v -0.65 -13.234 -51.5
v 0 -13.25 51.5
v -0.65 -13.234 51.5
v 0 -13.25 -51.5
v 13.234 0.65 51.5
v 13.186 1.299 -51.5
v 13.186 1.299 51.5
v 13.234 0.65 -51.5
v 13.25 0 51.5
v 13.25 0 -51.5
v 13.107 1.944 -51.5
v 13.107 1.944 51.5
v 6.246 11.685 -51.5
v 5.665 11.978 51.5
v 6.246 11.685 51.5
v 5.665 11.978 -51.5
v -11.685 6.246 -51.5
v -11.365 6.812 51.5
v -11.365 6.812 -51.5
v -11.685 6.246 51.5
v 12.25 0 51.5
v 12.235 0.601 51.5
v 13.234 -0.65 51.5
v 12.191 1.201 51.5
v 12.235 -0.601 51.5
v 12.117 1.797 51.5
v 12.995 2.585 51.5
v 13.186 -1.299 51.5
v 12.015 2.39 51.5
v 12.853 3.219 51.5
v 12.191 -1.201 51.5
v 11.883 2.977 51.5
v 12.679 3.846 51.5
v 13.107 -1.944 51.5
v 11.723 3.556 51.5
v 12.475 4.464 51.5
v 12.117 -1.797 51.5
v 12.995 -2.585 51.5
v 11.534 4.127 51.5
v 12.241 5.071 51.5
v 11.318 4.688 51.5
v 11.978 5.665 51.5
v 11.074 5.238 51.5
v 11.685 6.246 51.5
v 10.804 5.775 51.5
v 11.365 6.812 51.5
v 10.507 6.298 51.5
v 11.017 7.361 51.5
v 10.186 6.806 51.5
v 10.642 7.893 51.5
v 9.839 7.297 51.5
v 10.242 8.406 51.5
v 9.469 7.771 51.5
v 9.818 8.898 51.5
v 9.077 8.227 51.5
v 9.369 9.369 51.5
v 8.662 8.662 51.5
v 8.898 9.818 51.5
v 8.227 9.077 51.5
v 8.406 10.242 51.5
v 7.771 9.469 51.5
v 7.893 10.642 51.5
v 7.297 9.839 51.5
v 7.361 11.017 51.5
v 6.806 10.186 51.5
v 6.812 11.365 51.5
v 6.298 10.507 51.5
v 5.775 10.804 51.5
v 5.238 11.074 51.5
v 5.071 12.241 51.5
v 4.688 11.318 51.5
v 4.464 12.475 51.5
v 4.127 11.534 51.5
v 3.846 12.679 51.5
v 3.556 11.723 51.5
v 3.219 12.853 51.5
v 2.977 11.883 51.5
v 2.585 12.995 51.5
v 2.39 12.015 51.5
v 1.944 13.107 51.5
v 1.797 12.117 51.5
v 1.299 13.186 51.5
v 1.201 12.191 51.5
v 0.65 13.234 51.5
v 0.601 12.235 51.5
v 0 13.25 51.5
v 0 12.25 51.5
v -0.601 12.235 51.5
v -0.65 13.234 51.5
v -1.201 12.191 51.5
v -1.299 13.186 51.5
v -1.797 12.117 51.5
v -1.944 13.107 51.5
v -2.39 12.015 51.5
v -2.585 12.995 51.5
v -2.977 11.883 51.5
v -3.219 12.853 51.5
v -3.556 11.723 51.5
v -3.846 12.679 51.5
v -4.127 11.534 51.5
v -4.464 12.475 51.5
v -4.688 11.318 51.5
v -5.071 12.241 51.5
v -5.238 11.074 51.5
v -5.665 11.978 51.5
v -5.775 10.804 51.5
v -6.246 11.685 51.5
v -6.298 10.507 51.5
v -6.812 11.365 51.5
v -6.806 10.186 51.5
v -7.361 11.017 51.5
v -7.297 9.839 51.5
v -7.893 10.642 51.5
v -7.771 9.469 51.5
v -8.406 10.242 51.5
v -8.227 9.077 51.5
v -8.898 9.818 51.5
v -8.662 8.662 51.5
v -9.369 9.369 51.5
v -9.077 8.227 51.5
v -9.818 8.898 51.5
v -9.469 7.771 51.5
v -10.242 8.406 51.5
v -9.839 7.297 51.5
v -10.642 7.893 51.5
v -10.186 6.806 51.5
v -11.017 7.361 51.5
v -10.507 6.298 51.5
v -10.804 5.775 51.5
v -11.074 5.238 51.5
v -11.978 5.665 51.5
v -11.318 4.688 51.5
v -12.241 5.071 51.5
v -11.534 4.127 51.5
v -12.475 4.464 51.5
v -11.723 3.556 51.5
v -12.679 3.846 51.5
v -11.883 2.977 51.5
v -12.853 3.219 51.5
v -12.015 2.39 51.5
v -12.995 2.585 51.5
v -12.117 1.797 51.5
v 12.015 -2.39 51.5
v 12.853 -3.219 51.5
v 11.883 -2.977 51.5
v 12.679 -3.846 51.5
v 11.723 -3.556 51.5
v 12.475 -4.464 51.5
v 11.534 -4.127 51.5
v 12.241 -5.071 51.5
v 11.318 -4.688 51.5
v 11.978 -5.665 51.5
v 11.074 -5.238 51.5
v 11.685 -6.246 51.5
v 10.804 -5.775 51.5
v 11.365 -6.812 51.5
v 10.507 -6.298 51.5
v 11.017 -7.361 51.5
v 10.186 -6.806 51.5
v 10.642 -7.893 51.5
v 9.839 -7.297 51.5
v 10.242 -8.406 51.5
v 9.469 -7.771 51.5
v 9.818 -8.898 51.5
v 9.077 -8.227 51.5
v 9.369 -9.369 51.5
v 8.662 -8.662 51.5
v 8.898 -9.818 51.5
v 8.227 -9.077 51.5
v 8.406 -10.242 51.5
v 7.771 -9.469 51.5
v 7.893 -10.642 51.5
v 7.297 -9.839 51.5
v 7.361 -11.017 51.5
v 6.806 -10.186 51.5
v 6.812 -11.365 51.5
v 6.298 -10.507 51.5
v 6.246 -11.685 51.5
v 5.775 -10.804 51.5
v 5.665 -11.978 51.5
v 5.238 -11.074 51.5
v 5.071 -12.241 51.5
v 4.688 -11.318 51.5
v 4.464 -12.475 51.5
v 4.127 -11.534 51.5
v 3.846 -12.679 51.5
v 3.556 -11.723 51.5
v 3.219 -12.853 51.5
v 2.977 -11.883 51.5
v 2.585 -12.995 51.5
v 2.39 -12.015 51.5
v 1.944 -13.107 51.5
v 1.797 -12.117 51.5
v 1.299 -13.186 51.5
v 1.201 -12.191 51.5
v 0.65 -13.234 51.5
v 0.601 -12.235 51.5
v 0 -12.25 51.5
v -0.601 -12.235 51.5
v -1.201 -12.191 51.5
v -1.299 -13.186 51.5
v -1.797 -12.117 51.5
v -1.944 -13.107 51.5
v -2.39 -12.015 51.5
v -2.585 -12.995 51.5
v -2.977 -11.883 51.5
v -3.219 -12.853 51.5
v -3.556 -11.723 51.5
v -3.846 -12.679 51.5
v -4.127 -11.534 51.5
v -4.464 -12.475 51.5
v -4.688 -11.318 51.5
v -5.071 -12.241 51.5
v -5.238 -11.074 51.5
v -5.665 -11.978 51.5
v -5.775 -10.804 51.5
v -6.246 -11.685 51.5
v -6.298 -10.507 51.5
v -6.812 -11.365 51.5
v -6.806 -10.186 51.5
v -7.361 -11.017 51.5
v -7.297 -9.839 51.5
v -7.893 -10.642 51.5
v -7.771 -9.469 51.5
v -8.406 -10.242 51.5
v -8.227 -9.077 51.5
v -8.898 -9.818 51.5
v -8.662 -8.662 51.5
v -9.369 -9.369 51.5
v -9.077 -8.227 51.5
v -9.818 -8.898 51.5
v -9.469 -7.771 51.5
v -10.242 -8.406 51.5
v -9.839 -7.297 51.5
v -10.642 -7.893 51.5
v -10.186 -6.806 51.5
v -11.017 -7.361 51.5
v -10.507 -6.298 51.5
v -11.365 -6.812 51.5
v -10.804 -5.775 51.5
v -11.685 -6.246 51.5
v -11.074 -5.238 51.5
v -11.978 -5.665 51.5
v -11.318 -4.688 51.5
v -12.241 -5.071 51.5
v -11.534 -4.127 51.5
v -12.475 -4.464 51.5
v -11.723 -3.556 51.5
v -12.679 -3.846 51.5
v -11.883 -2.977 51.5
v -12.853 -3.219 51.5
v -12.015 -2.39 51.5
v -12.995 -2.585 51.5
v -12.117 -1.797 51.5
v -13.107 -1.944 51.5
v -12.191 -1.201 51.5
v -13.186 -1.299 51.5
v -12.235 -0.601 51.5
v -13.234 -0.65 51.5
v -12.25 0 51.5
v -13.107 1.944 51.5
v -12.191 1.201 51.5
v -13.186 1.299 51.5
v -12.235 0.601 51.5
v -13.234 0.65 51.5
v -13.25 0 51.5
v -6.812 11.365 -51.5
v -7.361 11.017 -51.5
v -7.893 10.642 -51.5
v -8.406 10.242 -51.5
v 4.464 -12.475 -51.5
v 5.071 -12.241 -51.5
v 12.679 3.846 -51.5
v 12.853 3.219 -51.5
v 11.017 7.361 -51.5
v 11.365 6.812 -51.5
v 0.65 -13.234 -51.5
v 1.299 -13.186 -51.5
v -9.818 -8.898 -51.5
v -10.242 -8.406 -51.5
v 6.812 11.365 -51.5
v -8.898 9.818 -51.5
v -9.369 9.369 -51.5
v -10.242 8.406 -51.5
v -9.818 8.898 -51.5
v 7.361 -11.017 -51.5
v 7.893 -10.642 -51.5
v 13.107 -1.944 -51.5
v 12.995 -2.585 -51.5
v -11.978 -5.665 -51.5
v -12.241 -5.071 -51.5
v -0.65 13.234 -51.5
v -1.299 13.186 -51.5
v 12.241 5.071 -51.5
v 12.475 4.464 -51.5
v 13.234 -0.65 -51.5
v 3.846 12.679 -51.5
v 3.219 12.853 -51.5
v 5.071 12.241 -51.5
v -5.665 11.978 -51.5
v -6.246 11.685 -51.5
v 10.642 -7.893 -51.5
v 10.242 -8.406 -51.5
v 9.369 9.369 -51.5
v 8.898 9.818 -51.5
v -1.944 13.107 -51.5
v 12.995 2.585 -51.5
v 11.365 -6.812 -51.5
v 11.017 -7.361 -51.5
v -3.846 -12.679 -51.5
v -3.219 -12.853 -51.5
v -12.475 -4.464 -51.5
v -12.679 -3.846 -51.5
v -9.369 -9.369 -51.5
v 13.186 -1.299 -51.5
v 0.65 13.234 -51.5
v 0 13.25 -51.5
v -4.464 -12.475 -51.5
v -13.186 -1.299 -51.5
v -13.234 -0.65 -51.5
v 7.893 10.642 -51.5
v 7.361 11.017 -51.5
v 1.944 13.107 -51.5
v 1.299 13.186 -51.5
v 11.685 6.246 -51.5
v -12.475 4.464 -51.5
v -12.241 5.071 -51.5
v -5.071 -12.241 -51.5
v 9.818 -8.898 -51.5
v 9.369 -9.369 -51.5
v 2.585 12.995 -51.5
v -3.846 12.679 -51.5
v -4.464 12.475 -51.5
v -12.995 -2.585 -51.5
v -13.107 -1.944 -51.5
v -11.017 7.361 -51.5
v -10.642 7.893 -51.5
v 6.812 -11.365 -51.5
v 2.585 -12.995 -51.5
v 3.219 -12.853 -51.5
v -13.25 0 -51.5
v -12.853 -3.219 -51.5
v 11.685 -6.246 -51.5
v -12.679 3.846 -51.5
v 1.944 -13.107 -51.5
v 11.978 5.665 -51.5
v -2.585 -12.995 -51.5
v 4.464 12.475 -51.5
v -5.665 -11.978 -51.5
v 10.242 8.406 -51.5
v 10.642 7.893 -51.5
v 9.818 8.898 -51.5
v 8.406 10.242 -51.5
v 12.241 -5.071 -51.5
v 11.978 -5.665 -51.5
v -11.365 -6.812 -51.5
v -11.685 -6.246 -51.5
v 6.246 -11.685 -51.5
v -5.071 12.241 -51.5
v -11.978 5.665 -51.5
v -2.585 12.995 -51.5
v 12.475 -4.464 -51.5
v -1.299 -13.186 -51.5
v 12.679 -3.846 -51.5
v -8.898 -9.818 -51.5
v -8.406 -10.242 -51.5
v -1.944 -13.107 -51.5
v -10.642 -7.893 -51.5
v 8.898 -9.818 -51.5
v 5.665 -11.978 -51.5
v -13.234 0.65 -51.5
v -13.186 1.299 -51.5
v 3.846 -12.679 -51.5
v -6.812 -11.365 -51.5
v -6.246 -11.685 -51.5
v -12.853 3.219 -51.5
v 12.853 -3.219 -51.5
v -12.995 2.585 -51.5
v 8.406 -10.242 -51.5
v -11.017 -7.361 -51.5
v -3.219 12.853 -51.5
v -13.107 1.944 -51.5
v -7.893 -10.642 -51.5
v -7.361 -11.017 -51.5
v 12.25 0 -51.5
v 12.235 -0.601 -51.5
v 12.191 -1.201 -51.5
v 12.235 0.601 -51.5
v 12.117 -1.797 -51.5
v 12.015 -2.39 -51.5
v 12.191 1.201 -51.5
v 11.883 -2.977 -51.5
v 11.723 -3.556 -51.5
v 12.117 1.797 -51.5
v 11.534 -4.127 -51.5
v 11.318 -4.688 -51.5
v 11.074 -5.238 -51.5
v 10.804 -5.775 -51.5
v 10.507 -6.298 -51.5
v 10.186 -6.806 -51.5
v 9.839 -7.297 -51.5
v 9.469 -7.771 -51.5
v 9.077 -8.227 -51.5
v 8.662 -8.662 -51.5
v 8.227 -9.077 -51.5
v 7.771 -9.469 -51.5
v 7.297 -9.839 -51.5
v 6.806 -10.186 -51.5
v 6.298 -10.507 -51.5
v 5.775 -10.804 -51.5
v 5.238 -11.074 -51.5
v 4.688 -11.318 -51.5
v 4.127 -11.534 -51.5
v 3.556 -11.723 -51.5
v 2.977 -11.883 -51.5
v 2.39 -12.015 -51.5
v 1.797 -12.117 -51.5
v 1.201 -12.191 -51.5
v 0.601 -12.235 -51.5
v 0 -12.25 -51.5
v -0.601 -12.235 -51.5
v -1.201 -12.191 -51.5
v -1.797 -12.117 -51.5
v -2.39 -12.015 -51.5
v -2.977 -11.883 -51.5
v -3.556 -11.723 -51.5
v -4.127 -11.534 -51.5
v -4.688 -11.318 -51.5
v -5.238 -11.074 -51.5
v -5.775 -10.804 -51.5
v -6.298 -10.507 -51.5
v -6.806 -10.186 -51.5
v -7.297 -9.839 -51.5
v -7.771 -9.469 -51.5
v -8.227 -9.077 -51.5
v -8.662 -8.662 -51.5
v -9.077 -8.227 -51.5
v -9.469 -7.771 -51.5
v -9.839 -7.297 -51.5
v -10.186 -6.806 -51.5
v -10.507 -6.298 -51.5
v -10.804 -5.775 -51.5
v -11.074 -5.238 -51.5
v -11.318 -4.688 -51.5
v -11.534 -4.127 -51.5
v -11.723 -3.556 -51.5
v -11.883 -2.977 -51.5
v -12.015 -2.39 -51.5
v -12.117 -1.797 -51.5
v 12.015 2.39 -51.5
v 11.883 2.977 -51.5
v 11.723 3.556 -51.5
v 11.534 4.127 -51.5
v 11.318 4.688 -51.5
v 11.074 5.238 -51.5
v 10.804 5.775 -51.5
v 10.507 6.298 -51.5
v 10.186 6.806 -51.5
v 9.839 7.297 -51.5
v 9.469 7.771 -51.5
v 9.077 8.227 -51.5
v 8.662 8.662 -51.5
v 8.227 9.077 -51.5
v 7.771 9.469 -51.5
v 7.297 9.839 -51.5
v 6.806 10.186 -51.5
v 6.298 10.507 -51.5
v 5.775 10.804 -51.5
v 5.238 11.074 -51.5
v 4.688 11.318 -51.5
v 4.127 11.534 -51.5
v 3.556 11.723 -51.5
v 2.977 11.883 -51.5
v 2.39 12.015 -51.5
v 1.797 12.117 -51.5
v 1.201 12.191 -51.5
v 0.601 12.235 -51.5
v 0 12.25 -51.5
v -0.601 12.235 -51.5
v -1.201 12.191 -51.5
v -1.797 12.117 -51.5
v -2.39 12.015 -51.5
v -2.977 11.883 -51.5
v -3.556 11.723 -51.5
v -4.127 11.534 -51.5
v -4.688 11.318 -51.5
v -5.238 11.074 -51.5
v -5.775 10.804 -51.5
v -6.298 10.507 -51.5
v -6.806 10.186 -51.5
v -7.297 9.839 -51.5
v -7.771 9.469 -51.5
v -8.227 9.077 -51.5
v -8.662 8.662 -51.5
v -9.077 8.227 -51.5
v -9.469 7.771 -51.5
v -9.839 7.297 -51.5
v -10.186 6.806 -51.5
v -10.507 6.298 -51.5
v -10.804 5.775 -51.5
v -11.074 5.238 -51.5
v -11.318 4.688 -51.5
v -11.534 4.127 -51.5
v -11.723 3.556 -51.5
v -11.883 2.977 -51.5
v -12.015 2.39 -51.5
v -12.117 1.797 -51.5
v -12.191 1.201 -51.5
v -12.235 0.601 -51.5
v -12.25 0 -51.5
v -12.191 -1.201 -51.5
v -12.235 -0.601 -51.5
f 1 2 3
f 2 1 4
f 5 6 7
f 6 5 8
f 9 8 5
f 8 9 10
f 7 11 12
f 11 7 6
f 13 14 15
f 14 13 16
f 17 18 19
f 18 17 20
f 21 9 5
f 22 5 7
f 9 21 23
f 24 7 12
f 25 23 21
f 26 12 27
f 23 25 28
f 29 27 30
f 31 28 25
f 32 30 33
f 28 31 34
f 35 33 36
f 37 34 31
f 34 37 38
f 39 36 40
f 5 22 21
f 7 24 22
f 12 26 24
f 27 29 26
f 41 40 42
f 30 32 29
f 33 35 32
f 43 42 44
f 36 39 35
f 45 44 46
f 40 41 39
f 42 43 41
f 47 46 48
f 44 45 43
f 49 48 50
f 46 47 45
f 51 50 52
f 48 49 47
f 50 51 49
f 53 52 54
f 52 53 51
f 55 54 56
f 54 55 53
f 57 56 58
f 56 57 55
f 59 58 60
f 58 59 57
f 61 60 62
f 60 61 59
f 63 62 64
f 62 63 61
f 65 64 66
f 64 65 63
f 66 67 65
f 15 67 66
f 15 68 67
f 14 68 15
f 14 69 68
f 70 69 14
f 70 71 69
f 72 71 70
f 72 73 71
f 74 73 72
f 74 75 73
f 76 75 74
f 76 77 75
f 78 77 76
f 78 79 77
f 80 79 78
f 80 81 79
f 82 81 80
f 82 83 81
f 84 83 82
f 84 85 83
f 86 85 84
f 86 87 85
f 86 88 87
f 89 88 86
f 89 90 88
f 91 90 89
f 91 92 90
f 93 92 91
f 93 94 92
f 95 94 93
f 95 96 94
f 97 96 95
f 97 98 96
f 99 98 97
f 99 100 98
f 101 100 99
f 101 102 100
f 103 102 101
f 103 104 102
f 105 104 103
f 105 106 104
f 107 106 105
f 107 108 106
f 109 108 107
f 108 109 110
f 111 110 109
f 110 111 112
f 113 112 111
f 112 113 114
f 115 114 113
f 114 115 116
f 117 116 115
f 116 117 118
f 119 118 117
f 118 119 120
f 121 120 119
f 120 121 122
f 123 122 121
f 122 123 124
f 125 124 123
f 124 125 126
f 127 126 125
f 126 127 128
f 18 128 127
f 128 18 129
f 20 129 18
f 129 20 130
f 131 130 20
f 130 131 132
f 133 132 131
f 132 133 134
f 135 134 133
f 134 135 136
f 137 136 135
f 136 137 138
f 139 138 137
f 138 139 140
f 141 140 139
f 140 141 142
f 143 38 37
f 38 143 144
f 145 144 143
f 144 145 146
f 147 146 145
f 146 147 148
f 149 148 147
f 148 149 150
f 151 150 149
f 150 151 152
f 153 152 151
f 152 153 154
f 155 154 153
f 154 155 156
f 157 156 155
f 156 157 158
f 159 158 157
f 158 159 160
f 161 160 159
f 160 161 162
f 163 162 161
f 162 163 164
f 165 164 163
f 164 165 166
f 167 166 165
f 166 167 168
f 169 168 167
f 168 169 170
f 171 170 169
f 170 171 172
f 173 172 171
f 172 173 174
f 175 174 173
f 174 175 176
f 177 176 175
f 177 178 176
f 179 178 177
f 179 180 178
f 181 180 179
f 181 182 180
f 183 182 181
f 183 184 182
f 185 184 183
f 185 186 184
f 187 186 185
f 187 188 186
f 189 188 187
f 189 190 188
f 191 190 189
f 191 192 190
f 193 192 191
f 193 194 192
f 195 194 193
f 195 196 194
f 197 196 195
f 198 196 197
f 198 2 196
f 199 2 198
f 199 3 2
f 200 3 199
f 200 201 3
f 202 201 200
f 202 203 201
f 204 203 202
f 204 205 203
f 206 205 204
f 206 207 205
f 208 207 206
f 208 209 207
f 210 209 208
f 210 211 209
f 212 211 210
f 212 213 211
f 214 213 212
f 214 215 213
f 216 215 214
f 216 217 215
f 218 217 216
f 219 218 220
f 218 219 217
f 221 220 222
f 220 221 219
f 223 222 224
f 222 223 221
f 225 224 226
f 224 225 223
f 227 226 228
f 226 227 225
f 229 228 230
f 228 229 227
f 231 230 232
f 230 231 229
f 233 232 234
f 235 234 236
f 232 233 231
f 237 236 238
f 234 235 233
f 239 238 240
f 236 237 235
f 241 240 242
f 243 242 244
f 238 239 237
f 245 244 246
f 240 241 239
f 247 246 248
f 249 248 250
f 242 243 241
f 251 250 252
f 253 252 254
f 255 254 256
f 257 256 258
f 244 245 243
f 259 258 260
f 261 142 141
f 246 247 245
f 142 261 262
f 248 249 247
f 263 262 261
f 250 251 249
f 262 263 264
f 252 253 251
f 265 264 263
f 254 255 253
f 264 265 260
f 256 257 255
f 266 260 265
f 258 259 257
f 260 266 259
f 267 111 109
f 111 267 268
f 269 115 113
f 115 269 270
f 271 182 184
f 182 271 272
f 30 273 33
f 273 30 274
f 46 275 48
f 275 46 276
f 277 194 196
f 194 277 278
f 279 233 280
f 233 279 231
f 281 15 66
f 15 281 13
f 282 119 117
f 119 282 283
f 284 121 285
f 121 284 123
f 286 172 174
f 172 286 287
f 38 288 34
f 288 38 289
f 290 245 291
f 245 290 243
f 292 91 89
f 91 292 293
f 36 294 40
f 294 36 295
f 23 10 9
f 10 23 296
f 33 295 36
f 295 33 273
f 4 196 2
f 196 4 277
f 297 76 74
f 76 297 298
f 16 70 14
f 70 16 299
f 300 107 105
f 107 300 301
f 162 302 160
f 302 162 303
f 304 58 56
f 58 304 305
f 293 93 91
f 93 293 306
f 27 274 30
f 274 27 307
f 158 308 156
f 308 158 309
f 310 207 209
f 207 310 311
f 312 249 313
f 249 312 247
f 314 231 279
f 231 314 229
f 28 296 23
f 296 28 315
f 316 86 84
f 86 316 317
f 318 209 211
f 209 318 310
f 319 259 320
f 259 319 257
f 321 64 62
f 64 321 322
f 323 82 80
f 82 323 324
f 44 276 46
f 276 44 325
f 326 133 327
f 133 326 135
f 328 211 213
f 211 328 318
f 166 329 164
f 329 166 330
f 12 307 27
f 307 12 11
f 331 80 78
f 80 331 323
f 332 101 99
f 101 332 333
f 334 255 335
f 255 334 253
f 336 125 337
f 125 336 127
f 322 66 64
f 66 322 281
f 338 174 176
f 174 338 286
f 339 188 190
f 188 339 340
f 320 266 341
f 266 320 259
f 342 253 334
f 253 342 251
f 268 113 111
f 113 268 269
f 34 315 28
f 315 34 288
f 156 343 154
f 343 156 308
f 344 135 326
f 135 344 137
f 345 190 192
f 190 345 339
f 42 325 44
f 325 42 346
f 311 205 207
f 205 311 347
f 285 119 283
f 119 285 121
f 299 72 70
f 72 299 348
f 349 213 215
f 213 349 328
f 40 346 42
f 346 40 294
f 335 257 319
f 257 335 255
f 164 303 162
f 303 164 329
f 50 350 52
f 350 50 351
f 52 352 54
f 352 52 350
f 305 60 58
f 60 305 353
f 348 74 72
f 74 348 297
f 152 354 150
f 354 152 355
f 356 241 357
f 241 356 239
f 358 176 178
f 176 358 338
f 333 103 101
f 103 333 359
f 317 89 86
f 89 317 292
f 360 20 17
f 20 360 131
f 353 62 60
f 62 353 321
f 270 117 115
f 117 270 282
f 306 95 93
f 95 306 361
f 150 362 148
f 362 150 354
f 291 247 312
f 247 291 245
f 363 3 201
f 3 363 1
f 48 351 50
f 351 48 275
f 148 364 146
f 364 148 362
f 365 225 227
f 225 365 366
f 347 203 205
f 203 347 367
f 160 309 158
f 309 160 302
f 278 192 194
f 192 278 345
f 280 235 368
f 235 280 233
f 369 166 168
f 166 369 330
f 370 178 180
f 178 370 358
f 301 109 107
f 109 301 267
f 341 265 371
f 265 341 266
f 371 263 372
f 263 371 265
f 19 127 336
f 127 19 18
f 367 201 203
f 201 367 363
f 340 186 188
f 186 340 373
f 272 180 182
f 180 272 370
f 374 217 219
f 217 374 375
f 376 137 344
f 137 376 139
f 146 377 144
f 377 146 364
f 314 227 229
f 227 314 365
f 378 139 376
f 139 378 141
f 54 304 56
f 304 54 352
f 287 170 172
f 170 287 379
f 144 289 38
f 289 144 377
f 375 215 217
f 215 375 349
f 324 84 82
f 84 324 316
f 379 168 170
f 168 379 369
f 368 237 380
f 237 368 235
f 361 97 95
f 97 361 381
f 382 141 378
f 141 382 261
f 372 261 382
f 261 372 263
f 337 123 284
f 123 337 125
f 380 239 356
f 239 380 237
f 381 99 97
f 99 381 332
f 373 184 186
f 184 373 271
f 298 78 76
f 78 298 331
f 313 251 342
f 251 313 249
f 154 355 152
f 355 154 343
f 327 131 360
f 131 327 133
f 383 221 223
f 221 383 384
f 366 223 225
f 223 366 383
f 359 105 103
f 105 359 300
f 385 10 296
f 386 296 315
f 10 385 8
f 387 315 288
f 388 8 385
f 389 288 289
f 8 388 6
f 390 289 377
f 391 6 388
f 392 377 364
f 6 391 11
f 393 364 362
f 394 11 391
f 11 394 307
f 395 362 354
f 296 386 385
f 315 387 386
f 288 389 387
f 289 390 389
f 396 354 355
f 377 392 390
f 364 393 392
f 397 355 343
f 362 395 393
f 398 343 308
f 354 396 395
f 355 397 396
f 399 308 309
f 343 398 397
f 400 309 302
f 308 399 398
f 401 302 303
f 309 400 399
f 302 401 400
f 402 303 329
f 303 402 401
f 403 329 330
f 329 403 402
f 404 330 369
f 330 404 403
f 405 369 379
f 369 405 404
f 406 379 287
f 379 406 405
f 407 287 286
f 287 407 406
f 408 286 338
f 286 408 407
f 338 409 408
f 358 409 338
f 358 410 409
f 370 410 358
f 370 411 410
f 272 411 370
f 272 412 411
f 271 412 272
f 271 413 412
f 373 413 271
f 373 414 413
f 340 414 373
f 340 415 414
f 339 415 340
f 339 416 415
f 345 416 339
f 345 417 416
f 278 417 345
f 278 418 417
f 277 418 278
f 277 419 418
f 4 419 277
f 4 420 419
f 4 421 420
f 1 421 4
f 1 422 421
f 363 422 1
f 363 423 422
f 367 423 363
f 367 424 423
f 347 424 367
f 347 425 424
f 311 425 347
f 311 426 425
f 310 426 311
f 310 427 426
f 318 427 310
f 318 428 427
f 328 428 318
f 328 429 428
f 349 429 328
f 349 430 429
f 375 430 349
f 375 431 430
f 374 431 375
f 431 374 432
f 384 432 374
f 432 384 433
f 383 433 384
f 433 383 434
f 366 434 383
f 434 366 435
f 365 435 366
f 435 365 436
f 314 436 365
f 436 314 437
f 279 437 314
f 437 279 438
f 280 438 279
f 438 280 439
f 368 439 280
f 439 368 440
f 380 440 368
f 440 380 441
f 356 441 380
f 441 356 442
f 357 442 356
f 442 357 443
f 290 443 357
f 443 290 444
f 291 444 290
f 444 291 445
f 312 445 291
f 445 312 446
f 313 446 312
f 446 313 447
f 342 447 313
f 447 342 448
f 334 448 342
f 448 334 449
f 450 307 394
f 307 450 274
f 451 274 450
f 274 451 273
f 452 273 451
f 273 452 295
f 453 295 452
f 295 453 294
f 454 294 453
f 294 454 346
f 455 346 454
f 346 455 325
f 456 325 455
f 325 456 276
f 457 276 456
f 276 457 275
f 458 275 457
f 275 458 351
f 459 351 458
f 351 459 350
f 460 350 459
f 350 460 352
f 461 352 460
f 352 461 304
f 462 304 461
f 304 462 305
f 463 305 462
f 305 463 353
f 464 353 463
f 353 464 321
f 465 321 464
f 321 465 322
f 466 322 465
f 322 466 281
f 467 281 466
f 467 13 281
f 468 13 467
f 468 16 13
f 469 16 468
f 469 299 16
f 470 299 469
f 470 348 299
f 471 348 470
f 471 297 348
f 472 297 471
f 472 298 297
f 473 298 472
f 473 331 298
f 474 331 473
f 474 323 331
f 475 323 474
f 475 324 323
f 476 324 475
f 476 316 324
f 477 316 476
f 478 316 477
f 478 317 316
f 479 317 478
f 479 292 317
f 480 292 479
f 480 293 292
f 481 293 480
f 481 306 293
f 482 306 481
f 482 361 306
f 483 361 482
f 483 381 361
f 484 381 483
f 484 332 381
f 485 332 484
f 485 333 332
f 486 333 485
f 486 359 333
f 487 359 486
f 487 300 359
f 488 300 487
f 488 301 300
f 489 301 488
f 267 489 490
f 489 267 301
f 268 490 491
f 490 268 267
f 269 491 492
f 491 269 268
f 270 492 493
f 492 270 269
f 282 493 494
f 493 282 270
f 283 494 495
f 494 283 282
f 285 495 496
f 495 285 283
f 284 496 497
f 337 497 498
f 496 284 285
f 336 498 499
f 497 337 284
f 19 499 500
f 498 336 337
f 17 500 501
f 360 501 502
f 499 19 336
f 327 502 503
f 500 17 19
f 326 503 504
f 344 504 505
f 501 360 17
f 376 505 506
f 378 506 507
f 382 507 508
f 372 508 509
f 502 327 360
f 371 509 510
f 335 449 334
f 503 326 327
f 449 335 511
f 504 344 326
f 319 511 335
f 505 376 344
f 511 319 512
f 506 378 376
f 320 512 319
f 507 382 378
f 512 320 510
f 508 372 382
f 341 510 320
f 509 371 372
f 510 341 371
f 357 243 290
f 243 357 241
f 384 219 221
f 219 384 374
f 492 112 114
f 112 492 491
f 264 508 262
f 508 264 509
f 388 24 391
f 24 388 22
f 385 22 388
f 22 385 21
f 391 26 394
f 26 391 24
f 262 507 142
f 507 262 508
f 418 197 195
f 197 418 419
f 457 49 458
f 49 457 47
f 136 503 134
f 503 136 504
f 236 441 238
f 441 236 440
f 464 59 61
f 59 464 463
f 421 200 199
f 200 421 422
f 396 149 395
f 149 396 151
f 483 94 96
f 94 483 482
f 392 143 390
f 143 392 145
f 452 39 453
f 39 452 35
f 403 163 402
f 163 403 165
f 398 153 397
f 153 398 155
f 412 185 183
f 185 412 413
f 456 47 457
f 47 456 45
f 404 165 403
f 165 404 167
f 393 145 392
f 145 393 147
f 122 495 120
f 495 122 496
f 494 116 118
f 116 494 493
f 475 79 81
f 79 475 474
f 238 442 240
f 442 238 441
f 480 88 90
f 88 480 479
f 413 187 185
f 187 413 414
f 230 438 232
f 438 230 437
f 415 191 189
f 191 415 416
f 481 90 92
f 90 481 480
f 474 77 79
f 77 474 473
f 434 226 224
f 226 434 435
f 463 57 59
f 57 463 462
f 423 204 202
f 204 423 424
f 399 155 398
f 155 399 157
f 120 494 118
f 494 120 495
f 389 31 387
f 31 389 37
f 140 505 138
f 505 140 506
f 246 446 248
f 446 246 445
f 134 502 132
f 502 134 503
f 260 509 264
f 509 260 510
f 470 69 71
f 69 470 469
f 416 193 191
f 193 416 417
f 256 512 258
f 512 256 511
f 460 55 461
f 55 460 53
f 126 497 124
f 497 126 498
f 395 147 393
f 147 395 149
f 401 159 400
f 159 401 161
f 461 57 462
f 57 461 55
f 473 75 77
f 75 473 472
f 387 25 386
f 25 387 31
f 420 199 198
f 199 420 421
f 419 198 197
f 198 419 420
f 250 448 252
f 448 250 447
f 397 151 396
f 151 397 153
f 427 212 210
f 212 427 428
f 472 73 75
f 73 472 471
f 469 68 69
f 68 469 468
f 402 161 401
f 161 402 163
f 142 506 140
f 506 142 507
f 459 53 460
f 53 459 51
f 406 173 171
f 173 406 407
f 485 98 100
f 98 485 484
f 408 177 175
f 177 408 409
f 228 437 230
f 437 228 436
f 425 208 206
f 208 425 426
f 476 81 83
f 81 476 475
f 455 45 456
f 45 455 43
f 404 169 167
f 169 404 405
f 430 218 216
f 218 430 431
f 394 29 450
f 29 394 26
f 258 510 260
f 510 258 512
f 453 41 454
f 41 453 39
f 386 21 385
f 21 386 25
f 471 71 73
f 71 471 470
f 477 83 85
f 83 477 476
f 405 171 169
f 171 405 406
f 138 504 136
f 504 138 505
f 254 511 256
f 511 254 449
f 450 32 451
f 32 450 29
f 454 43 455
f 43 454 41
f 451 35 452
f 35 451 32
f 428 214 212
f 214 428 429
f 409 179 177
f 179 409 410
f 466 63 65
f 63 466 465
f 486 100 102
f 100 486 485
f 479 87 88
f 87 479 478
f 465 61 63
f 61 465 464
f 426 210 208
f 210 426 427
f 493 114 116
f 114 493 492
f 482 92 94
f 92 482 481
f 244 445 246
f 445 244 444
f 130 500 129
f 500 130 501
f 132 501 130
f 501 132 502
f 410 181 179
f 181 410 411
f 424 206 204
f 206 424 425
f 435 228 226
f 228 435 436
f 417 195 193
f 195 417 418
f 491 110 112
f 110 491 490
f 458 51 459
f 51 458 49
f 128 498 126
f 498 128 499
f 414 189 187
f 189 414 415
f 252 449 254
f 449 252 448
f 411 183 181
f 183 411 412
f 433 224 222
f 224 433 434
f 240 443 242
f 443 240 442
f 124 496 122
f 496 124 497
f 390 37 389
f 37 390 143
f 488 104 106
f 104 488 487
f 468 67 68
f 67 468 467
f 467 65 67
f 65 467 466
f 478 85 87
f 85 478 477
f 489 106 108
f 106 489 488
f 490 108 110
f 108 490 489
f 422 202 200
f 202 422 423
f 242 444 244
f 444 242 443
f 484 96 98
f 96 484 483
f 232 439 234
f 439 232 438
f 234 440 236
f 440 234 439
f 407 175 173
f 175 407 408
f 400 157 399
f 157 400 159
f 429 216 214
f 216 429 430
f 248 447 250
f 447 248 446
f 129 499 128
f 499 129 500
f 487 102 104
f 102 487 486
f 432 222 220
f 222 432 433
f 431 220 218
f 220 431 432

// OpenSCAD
/*
 * 30mm threaded to Olympic Barbell (2 inch / 50mm) adapter
 *
 * Copyright 2020 Peter Senna Tschudin <peter.senna@gmail.com>
 *
 * This program is free software: you can redistribute it and/or
 * modify it under the terms of the GNU General Public License
 * version  2.
 *
 * This program is distributed in the hope that it will be useful,
 * but WITHOUT ANY WARRANTY; without even the implied warranty of
 * MERCHANTABILITY or FITNESS FOR A PARTICULAR PURPOSE.  See the
 * GNU General Public License for more details.
 *
 * Print info: Sliced with PrusaSlic3r using the 0.2mm speed profile.
 * PETG, 10 top solid layers, 10 bottom solid layers, 6 perimeters,
 * no supports.
 *
 *                         ATTENTION!!!
 *
 * Double check dimensions of your barbell dimensions before printing.
 * This is 10 hours+ print, and it is a tight fit for *my* barbell:
 * My barbell screw:
 *  - 29.65 mm external diameter
 * My barbell screw thread:
 *  - 6.5 mm pitch
 *  - 3.5 mm wide
 *  - 1.5 mm deep
 *
 * Olympic barbell weight ending specs:
 *  - 49.4 mm - 49.56 mm diameter
 *  - 431.79 mm length
 *  - 41.27 mm stopper length
 */

$fn=128;

//cylinder(d=27.5, h=26, center=true);

// The sketch says it should be 107 here,
// but it may be a good idea to leave some margin
adapter1_h = 103;

// Adjusting these may be needed depending on your printer.
// So do some testing with smaller adapter1_h first before
// going for the full print.
thread_d = 24.5;
adapter1_external_d = 26.5;

difference() {
    cylinder(d=adapter1_external_d, h=adapter1_h, center=true);
    cylinder(d=thread_d, h=adapter1_h+1, center=true);
}

// Commenting this out as for adapter1,
// it may be a better idea to not have a thread.

/*
difference() {
    cylinder(d=32, h=200, center=true);
    
    // rectangle=0.225 for 1mm thread tooth depth
    translate([0,0,36]) metric_thread (diameter=30, pitch=6.5, length=65, square=true, rectangle=0.28, n_starts=1, thread_size=9);

    translate([0,0,-63.5]) cylinder(d=30, h=200, $fn=50, center=true);
    translate([0,0,-(200+50+30)/2]) sphere(50);
}

translate([0,0,0]) difference() {
    union() {
        cylinder(d=50.5, h=200,center=true);
        translate([0,0,-(200-21.25)/2]) cylinder(d=76,h=21.25,center=true);
    }
    cylinder(d=32, h=201,center=true);
    translate([0,0,-(200+50+30)/2]) sphere(50);
}
*/
/*
 * Peter's code ends here. The following is a library from
 * Dan Kirshner, copied and pasted here for convenience.
 */

/*
 * ISO-standard metric threads, following this specification:
 *          http://en.wikipedia.org/wiki/ISO_metric_screw_thread
 *
 * Copyright 2017 Dan Kirshner - dan_kirshner@yahoo.com
 * This program is free software: you can redistribute it and/or modify
 * it under the terms of the GNU General Public License as published by
 * the Free Software Foundation, either version 3 of the License, or
 * (at your option) any later version.
 *
 * This program is distributed in the hope that it will be useful,
 * but WITHOUT ANY WARRANTY; without even the implied warranty of
 * MERCHANTABILITY or FITNESS FOR A PARTICULAR PURPOSE.  See the
 * GNU General Public License for more details.
 *
 * See <http://www.gnu.org/licenses/>.
 *
 * Version 2.4.  2019-07-14  Add test option - do not render threads.
 * Version 2.3.  2017-08-31  Default for leadin: 0 (best for internal threads).
 * Version 2.2.  2017-01-01  Correction for angle; leadfac option.  (Thanks to
 *                           Andrew Allen <a2intl@gmail.com>.)
 * Version 2.1.  2016-12-04  Chamfer bottom end (low-z); leadin option.
 * Version 2.0.  2016-11-05  Backwards compatibility (earlier OpenSCAD) fixes.
 * Version 1.9.  2016-07-03  Option: tapered.
 * Version 1.8.  2016-01-08  Option: (non-standard) angle.
 * Version 1.7.  2015-11-28  Larger x-increment - for small-diameters.
 * Version 1.6.  2015-09-01  Options: square threads, rectangular threads.
 * Version 1.5.  2015-06-12  Options: thread_size, groove.
 * Version 1.4.  2014-10-17  Use "faces" instead of "triangles" for polyhedron
 * Version 1.3.  2013-12-01  Correct loop over turns -- don't have early cut-off
 * Version 1.2.  2012-09-09  Use discrete polyhedra rather than linear_extrude ()
 * Version 1.1.  2012-09-07  Corrected to right-hand threads!
 */

// ----------------------------------------------------------------------------
function segments (diameter) = min (50, max (ceil (diameter*6), 25));


// ----------------------------------------------------------------------------
// diameter -    outside diameter of threads in mm. Default: 8.
// pitch    -    thread axial "travel" per turn in mm.  Default: 1.
// length   -    overall axial length of thread in mm.  Default: 1.
// internal -    true = clearances for internal thread (e.g., a nut).
//               false = clearances for external thread (e.g., a bolt).
//               (Internal threads should be "cut out" from a solid using
//               difference ()).  Default: false.
// n_starts -    Number of thread starts (e.g., DNA, a "double helix," has
//               n_starts=2).  See wikipedia Screw_thread.  Default: 1.
// thread_size - (non-standard) axial width of a single thread "V" - independent
//               of pitch.  Default: same as pitch.
// groove      - (non-standard) true = subtract inverted "V" from cylinder
//                (rather thanadd protruding "V" to cylinder).  Default: false.
// square      - true = square threads (per
//               https://en.wikipedia.org/wiki/Square_thread_form).  Default:
//               false.
// rectangle   - (non-standard) "Rectangular" thread - ratio depth/(axial) width
//               Default: 0 (standard "v" thread).
// angle       - (non-standard) angle (deg) of thread side from perpendicular to
//               axis (default = standard = 30 degrees).
// taper       - diameter change per length (National Pipe Thread/ANSI B1.20.1
//               is 1" diameter per 16" length). Taper decreases from 'diameter'
//               as z increases.  Default: 0 (no taper).
// leadin      - 0 (default): no chamfer; 1: chamfer (45 degree) at max-z end;
//               2: chamfer at both ends, 3: chamfer at z=0 end.
// leadfac     - scale of leadin chamfer (default: 1.0 = 1/2 thread).
// test        - true = do not render threads (just draw "blank" cylinder).
//               Default: false (draw threads).
module metric_thread (diameter=8, pitch=1, length=1, internal=false, n_starts=1,
                      thread_size=-1, groove=false, square=false, rectangle=0,
                      angle=30, taper=0, leadin=0, leadfac=1.0, test=false)
{
   // thread_size: size of thread "V" different than travel per turn (pitch).
   // Default: same as pitch.
   local_thread_size = thread_size == -1 ? pitch : thread_size;
   local_rectangle = rectangle ? rectangle : 1;

   n_segments = segments (diameter);
   h = (test && ! internal) ? 0 : (square || rectangle) ? local_thread_size*local_rectangle/2 : local_thread_size / (2 * tan(angle));

   h_fac1 = (square || rectangle) ? 0.90 : 0.625;

   // External thread includes additional relief.
   h_fac2 = (square || rectangle) ? 0.95 : 5.3/8;

   tapered_diameter = diameter - length*taper;

   difference () {
      union () {
         if (! groove) {
            if (! test) {
               metric_thread_turns (diameter, pitch, length, internal, n_starts,
                                    local_thread_size, groove, square, rectangle, angle,
                                    taper);
            }
         }

         difference () {

            // Solid center, including Dmin truncation.
            if (groove) {
               cylinder (r1=diameter/2, r2=tapered_diameter/2,
                         h=length, $fn=n_segments);
            } else if (internal) {
               cylinder (r1=diameter/2 - h*h_fac1, r2=tapered_diameter/2 - h*h_fac1,
                         h=length, $fn=n_segments);
            } else {

               // External thread.
               cylinder (r1=diameter/2 - h*h_fac2, r2=tapered_diameter/2 - h*h_fac2,
                         h=length, $fn=n_segments);
            }

            if (groove) {
               if (! test) {
                  metric_thread_turns (diameter, pitch, length, internal, n_starts,
                                       local_thread_size, groove, square, rectangle,
                                       angle, taper);
               }
            }
         }
      }

      // chamfer z=0 end if leadin is 2 or 3
      if (leadin == 2 || leadin == 3) {
         difference () {
            cylinder (r=diameter/2 + 1, h=h*h_fac1*leadfac, $fn=n_segments);

            cylinder (r2=diameter/2, r1=diameter/2 - h*h_fac1*leadfac, h=h*h_fac1*leadfac,
                      $fn=n_segments);
         }
      }

      // chamfer z-max end if leadin is 1 or 2.
      if (leadin == 1 || leadin == 2) {
         translate ([0, 0, length + 0.05 - h*h_fac1*leadfac]) {
            difference () {
               cylinder (r=diameter/2 + 1, h=h*h_fac1*leadfac, $fn=n_segments);
               cylinder (r1=tapered_diameter/2, r2=tapered_diameter/2 - h*h_fac1*leadfac, h=h*h_fac1*leadfac,
                         $fn=n_segments);
            }
         }
      }
   }
}


// ----------------------------------------------------------------------------
// Input units in inches.
// Note: units of measure in drawing are mm!
module english_thread (diameter=0.25, threads_per_inch=20, length=1,
                      internal=false, n_starts=1, thread_size=-1, groove=false,
                      square=false, rectangle=0, angle=30, taper=0, leadin=0,
                      leadfac=1.0, test=false)
{
   // Convert to mm.
   mm_diameter = diameter*25.4;
   mm_pitch = (1.0/threads_per_inch)*25.4;
   mm_length = length*25.4;

   echo (str ("mm_diameter: ", mm_diameter));
   echo (str ("mm_pitch: ", mm_pitch));
   echo (str ("mm_length: ", mm_length));
   metric_thread (mm_diameter, mm_pitch, mm_length, internal, n_starts,
                  thread_size, groove, square, rectangle, angle, taper, leadin,
                  leadfac, test);
}

// ----------------------------------------------------------------------------
module metric_thread_turns (diameter, pitch, length, internal, n_starts,
                            thread_size, groove, square, rectangle, angle,
                            taper)
{
   // Number of turns needed.
   n_turns = floor (length/pitch);

   intersection () {

      // Start one below z = 0.  Gives an extra turn at each end.
      for (i=[-1*n_starts : n_turns+1]) {
         translate ([0, 0, i*pitch]) {
            metric_thread_turn (diameter, pitch, internal, n_starts,
                                thread_size, groove, square, rectangle, angle,
                                taper, i*pitch);
         }
      }

      // Cut to length.
      translate ([0, 0, length/2]) {
         cube ([diameter*3, diameter*3, length], center=true);
      }
   }
}


// ----------------------------------------------------------------------------
module metric_thread_turn (diameter, pitch, internal, n_starts, thread_size,
                           groove, square, rectangle, angle, taper, z)
{
   n_segments = segments (diameter);
   fraction_circle = 1.0/n_segments;
   for (i=[0 : n_segments-1]) {
      rotate ([0, 0, i*360*fraction_circle]) {
         translate ([0, 0, i*n_starts*pitch*fraction_circle]) {
            //current_diameter = diameter - taper*(z + i*n_starts*pitch*fraction_circle);
            thread_polyhedron ((diameter - taper*(z + i*n_starts*pitch*fraction_circle))/2,
                               pitch, internal, n_starts, thread_size, groove,
                               square, rectangle, angle);
         }
      }
   }
}


// ----------------------------------------------------------------------------
module thread_polyhedron (radius, pitch, internal, n_starts, thread_size,
                          groove, square, rectangle, angle)
{
   n_segments = segments (radius*2);
   fraction_circle = 1.0/n_segments;

   local_rectangle = rectangle ? rectangle : 1;

   h = (square || rectangle) ? thread_size*local_rectangle/2 : thread_size / (2 * tan(angle));
   outer_r = radius + (internal ? h/20 : 0); // Adds internal relief.
   //echo (str ("outer_r: ", outer_r));

   // A little extra on square thread -- make sure overlaps cylinder.
   h_fac1 = (square || rectangle) ? 1.1 : 0.875;
   inner_r = radius - h*h_fac1; // Does NOT do Dmin_truncation - do later with
                                // cylinder.

   translate_y = groove ? outer_r + inner_r : 0;
   reflect_x   = groove ? 1 : 0;

   // Make these just slightly bigger (keep in proportion) so polyhedra will
   // overlap.
   x_incr_outer = (! groove ? outer_r : inner_r) * fraction_circle * 2 * PI * 1.02;
   x_incr_inner = (! groove ? inner_r : outer_r) * fraction_circle * 2 * PI * 1.02;
   z_incr = n_starts * pitch * fraction_circle * 1.005;

   /*
    (angles x0 and x3 inner are actually 60 deg)

                          /\  (x2_inner, z2_inner) [2]
                         /  \
   (x3_inner, z3_inner) /    \
                  [3]   \     \
                        |\     \ (x2_outer, z2_outer) [6]
                        | \    /
                        |  \  /|
             z          |[7]\/ / (x1_outer, z1_outer) [5]
             |          |   | /
             |   x      |   |/
             |  /       |   / (x0_outer, z0_outer) [4]
             | /        |  /     (behind: (x1_inner, z1_inner) [1]
             |/         | /
    y________|          |/
   (r)                  / (x0_inner, z0_inner) [0]

   */

   x1_outer = outer_r * fraction_circle * 2 * PI;

   z0_outer = (outer_r - inner_r) * tan(angle);
   //echo (str ("z0_outer: ", z0_outer));

   //polygon ([[inner_r, 0], [outer_r, z0_outer],
   //        [outer_r, 0.5*pitch], [inner_r, 0.5*pitch]]);
   z1_outer = z0_outer + z_incr;

   // Give internal square threads some clearance in the z direction, too.
   bottom = internal ? 0.235 : 0.25;
   top    = internal ? 0.765 : 0.75;

   translate ([0, translate_y, 0]) {
      mirror ([reflect_x, 0, 0]) {

         if (square || rectangle) {

            // Rule for face ordering: look at polyhedron from outside: points must
            // be in clockwise order.
            polyhedron (
               points = [
                         [-x_incr_inner/2, -inner_r, bottom*thread_size],         // [0]
                         [x_incr_inner/2, -inner_r, bottom*thread_size + z_incr], // [1]
                         [x_incr_inner/2, -inner_r, top*thread_size + z_incr],    // [2]
                         [-x_incr_inner/2, -inner_r, top*thread_size],            // [3]

                         [-x_incr_outer/2, -outer_r, bottom*thread_size],         // [4]
                         [x_incr_outer/2, -outer_r, bottom*thread_size + z_incr], // [5]
                         [x_incr_outer/2, -outer_r, top*thread_size + z_incr],    // [6]
                         [-x_incr_outer/2, -outer_r, top*thread_size]             // [7]
                        ],

               faces = [
                         [0, 3, 7, 4],  // This-side trapezoid

                         [1, 5, 6, 2],  // Back-side trapezoid

                         [0, 1, 2, 3],  // Inner rectangle

                         [4, 7, 6, 5],  // Outer rectangle

                         // These are not planar, so do with separate triangles.
                         [7, 2, 6],     // Upper rectangle, bottom
                         [7, 3, 2],     // Upper rectangle, top

                         [0, 5, 1],     // Lower rectangle, bottom
                         [0, 4, 5]      // Lower rectangle, top
                        ]
            );
         } else {

            // Rule for face ordering: look at polyhedron from outside: points must
            // be in clockwise order.
            polyhedron (
               points = [
                         [-x_incr_inner/2, -inner_r, 0],                        // [0]
                         [x_incr_inner/2, -inner_r, z_incr],                    // [1]
                         [x_incr_inner/2, -inner_r, thread_size + z_incr],      // [2]
                         [-x_incr_inner/2, -inner_r, thread_size],              // [3]

                         [-x_incr_outer/2, -outer_r, z0_outer],                 // [4]
                         [x_incr_outer/2, -outer_r, z0_outer + z_incr],         // [5]
                         [x_incr_outer/2, -outer_r, thread_size - z0_outer + z_incr], // [6]
                         [-x_incr_outer/2, -outer_r, thread_size - z0_outer]    // [7]
                        ],

               faces = [
                         [0, 3, 7, 4],  // This-side trapezoid

                         [1, 5, 6, 2],  // Back-side trapezoid

                         [0, 1, 2, 3],  // Inner rectangle

                         [4, 7, 6, 5],  // Outer rectangle

                         // These are not planar, so do with separate triangles.
                         [7, 2, 6],     // Upper rectangle, bottom
                         [7, 3, 2],     // Upper rectangle, top

                         [0, 5, 1],     // Lower rectangle, bottom
                         [0, 4, 5]      // Lower rectangle, top
                        ]
            );
         }
      }
   }
}
